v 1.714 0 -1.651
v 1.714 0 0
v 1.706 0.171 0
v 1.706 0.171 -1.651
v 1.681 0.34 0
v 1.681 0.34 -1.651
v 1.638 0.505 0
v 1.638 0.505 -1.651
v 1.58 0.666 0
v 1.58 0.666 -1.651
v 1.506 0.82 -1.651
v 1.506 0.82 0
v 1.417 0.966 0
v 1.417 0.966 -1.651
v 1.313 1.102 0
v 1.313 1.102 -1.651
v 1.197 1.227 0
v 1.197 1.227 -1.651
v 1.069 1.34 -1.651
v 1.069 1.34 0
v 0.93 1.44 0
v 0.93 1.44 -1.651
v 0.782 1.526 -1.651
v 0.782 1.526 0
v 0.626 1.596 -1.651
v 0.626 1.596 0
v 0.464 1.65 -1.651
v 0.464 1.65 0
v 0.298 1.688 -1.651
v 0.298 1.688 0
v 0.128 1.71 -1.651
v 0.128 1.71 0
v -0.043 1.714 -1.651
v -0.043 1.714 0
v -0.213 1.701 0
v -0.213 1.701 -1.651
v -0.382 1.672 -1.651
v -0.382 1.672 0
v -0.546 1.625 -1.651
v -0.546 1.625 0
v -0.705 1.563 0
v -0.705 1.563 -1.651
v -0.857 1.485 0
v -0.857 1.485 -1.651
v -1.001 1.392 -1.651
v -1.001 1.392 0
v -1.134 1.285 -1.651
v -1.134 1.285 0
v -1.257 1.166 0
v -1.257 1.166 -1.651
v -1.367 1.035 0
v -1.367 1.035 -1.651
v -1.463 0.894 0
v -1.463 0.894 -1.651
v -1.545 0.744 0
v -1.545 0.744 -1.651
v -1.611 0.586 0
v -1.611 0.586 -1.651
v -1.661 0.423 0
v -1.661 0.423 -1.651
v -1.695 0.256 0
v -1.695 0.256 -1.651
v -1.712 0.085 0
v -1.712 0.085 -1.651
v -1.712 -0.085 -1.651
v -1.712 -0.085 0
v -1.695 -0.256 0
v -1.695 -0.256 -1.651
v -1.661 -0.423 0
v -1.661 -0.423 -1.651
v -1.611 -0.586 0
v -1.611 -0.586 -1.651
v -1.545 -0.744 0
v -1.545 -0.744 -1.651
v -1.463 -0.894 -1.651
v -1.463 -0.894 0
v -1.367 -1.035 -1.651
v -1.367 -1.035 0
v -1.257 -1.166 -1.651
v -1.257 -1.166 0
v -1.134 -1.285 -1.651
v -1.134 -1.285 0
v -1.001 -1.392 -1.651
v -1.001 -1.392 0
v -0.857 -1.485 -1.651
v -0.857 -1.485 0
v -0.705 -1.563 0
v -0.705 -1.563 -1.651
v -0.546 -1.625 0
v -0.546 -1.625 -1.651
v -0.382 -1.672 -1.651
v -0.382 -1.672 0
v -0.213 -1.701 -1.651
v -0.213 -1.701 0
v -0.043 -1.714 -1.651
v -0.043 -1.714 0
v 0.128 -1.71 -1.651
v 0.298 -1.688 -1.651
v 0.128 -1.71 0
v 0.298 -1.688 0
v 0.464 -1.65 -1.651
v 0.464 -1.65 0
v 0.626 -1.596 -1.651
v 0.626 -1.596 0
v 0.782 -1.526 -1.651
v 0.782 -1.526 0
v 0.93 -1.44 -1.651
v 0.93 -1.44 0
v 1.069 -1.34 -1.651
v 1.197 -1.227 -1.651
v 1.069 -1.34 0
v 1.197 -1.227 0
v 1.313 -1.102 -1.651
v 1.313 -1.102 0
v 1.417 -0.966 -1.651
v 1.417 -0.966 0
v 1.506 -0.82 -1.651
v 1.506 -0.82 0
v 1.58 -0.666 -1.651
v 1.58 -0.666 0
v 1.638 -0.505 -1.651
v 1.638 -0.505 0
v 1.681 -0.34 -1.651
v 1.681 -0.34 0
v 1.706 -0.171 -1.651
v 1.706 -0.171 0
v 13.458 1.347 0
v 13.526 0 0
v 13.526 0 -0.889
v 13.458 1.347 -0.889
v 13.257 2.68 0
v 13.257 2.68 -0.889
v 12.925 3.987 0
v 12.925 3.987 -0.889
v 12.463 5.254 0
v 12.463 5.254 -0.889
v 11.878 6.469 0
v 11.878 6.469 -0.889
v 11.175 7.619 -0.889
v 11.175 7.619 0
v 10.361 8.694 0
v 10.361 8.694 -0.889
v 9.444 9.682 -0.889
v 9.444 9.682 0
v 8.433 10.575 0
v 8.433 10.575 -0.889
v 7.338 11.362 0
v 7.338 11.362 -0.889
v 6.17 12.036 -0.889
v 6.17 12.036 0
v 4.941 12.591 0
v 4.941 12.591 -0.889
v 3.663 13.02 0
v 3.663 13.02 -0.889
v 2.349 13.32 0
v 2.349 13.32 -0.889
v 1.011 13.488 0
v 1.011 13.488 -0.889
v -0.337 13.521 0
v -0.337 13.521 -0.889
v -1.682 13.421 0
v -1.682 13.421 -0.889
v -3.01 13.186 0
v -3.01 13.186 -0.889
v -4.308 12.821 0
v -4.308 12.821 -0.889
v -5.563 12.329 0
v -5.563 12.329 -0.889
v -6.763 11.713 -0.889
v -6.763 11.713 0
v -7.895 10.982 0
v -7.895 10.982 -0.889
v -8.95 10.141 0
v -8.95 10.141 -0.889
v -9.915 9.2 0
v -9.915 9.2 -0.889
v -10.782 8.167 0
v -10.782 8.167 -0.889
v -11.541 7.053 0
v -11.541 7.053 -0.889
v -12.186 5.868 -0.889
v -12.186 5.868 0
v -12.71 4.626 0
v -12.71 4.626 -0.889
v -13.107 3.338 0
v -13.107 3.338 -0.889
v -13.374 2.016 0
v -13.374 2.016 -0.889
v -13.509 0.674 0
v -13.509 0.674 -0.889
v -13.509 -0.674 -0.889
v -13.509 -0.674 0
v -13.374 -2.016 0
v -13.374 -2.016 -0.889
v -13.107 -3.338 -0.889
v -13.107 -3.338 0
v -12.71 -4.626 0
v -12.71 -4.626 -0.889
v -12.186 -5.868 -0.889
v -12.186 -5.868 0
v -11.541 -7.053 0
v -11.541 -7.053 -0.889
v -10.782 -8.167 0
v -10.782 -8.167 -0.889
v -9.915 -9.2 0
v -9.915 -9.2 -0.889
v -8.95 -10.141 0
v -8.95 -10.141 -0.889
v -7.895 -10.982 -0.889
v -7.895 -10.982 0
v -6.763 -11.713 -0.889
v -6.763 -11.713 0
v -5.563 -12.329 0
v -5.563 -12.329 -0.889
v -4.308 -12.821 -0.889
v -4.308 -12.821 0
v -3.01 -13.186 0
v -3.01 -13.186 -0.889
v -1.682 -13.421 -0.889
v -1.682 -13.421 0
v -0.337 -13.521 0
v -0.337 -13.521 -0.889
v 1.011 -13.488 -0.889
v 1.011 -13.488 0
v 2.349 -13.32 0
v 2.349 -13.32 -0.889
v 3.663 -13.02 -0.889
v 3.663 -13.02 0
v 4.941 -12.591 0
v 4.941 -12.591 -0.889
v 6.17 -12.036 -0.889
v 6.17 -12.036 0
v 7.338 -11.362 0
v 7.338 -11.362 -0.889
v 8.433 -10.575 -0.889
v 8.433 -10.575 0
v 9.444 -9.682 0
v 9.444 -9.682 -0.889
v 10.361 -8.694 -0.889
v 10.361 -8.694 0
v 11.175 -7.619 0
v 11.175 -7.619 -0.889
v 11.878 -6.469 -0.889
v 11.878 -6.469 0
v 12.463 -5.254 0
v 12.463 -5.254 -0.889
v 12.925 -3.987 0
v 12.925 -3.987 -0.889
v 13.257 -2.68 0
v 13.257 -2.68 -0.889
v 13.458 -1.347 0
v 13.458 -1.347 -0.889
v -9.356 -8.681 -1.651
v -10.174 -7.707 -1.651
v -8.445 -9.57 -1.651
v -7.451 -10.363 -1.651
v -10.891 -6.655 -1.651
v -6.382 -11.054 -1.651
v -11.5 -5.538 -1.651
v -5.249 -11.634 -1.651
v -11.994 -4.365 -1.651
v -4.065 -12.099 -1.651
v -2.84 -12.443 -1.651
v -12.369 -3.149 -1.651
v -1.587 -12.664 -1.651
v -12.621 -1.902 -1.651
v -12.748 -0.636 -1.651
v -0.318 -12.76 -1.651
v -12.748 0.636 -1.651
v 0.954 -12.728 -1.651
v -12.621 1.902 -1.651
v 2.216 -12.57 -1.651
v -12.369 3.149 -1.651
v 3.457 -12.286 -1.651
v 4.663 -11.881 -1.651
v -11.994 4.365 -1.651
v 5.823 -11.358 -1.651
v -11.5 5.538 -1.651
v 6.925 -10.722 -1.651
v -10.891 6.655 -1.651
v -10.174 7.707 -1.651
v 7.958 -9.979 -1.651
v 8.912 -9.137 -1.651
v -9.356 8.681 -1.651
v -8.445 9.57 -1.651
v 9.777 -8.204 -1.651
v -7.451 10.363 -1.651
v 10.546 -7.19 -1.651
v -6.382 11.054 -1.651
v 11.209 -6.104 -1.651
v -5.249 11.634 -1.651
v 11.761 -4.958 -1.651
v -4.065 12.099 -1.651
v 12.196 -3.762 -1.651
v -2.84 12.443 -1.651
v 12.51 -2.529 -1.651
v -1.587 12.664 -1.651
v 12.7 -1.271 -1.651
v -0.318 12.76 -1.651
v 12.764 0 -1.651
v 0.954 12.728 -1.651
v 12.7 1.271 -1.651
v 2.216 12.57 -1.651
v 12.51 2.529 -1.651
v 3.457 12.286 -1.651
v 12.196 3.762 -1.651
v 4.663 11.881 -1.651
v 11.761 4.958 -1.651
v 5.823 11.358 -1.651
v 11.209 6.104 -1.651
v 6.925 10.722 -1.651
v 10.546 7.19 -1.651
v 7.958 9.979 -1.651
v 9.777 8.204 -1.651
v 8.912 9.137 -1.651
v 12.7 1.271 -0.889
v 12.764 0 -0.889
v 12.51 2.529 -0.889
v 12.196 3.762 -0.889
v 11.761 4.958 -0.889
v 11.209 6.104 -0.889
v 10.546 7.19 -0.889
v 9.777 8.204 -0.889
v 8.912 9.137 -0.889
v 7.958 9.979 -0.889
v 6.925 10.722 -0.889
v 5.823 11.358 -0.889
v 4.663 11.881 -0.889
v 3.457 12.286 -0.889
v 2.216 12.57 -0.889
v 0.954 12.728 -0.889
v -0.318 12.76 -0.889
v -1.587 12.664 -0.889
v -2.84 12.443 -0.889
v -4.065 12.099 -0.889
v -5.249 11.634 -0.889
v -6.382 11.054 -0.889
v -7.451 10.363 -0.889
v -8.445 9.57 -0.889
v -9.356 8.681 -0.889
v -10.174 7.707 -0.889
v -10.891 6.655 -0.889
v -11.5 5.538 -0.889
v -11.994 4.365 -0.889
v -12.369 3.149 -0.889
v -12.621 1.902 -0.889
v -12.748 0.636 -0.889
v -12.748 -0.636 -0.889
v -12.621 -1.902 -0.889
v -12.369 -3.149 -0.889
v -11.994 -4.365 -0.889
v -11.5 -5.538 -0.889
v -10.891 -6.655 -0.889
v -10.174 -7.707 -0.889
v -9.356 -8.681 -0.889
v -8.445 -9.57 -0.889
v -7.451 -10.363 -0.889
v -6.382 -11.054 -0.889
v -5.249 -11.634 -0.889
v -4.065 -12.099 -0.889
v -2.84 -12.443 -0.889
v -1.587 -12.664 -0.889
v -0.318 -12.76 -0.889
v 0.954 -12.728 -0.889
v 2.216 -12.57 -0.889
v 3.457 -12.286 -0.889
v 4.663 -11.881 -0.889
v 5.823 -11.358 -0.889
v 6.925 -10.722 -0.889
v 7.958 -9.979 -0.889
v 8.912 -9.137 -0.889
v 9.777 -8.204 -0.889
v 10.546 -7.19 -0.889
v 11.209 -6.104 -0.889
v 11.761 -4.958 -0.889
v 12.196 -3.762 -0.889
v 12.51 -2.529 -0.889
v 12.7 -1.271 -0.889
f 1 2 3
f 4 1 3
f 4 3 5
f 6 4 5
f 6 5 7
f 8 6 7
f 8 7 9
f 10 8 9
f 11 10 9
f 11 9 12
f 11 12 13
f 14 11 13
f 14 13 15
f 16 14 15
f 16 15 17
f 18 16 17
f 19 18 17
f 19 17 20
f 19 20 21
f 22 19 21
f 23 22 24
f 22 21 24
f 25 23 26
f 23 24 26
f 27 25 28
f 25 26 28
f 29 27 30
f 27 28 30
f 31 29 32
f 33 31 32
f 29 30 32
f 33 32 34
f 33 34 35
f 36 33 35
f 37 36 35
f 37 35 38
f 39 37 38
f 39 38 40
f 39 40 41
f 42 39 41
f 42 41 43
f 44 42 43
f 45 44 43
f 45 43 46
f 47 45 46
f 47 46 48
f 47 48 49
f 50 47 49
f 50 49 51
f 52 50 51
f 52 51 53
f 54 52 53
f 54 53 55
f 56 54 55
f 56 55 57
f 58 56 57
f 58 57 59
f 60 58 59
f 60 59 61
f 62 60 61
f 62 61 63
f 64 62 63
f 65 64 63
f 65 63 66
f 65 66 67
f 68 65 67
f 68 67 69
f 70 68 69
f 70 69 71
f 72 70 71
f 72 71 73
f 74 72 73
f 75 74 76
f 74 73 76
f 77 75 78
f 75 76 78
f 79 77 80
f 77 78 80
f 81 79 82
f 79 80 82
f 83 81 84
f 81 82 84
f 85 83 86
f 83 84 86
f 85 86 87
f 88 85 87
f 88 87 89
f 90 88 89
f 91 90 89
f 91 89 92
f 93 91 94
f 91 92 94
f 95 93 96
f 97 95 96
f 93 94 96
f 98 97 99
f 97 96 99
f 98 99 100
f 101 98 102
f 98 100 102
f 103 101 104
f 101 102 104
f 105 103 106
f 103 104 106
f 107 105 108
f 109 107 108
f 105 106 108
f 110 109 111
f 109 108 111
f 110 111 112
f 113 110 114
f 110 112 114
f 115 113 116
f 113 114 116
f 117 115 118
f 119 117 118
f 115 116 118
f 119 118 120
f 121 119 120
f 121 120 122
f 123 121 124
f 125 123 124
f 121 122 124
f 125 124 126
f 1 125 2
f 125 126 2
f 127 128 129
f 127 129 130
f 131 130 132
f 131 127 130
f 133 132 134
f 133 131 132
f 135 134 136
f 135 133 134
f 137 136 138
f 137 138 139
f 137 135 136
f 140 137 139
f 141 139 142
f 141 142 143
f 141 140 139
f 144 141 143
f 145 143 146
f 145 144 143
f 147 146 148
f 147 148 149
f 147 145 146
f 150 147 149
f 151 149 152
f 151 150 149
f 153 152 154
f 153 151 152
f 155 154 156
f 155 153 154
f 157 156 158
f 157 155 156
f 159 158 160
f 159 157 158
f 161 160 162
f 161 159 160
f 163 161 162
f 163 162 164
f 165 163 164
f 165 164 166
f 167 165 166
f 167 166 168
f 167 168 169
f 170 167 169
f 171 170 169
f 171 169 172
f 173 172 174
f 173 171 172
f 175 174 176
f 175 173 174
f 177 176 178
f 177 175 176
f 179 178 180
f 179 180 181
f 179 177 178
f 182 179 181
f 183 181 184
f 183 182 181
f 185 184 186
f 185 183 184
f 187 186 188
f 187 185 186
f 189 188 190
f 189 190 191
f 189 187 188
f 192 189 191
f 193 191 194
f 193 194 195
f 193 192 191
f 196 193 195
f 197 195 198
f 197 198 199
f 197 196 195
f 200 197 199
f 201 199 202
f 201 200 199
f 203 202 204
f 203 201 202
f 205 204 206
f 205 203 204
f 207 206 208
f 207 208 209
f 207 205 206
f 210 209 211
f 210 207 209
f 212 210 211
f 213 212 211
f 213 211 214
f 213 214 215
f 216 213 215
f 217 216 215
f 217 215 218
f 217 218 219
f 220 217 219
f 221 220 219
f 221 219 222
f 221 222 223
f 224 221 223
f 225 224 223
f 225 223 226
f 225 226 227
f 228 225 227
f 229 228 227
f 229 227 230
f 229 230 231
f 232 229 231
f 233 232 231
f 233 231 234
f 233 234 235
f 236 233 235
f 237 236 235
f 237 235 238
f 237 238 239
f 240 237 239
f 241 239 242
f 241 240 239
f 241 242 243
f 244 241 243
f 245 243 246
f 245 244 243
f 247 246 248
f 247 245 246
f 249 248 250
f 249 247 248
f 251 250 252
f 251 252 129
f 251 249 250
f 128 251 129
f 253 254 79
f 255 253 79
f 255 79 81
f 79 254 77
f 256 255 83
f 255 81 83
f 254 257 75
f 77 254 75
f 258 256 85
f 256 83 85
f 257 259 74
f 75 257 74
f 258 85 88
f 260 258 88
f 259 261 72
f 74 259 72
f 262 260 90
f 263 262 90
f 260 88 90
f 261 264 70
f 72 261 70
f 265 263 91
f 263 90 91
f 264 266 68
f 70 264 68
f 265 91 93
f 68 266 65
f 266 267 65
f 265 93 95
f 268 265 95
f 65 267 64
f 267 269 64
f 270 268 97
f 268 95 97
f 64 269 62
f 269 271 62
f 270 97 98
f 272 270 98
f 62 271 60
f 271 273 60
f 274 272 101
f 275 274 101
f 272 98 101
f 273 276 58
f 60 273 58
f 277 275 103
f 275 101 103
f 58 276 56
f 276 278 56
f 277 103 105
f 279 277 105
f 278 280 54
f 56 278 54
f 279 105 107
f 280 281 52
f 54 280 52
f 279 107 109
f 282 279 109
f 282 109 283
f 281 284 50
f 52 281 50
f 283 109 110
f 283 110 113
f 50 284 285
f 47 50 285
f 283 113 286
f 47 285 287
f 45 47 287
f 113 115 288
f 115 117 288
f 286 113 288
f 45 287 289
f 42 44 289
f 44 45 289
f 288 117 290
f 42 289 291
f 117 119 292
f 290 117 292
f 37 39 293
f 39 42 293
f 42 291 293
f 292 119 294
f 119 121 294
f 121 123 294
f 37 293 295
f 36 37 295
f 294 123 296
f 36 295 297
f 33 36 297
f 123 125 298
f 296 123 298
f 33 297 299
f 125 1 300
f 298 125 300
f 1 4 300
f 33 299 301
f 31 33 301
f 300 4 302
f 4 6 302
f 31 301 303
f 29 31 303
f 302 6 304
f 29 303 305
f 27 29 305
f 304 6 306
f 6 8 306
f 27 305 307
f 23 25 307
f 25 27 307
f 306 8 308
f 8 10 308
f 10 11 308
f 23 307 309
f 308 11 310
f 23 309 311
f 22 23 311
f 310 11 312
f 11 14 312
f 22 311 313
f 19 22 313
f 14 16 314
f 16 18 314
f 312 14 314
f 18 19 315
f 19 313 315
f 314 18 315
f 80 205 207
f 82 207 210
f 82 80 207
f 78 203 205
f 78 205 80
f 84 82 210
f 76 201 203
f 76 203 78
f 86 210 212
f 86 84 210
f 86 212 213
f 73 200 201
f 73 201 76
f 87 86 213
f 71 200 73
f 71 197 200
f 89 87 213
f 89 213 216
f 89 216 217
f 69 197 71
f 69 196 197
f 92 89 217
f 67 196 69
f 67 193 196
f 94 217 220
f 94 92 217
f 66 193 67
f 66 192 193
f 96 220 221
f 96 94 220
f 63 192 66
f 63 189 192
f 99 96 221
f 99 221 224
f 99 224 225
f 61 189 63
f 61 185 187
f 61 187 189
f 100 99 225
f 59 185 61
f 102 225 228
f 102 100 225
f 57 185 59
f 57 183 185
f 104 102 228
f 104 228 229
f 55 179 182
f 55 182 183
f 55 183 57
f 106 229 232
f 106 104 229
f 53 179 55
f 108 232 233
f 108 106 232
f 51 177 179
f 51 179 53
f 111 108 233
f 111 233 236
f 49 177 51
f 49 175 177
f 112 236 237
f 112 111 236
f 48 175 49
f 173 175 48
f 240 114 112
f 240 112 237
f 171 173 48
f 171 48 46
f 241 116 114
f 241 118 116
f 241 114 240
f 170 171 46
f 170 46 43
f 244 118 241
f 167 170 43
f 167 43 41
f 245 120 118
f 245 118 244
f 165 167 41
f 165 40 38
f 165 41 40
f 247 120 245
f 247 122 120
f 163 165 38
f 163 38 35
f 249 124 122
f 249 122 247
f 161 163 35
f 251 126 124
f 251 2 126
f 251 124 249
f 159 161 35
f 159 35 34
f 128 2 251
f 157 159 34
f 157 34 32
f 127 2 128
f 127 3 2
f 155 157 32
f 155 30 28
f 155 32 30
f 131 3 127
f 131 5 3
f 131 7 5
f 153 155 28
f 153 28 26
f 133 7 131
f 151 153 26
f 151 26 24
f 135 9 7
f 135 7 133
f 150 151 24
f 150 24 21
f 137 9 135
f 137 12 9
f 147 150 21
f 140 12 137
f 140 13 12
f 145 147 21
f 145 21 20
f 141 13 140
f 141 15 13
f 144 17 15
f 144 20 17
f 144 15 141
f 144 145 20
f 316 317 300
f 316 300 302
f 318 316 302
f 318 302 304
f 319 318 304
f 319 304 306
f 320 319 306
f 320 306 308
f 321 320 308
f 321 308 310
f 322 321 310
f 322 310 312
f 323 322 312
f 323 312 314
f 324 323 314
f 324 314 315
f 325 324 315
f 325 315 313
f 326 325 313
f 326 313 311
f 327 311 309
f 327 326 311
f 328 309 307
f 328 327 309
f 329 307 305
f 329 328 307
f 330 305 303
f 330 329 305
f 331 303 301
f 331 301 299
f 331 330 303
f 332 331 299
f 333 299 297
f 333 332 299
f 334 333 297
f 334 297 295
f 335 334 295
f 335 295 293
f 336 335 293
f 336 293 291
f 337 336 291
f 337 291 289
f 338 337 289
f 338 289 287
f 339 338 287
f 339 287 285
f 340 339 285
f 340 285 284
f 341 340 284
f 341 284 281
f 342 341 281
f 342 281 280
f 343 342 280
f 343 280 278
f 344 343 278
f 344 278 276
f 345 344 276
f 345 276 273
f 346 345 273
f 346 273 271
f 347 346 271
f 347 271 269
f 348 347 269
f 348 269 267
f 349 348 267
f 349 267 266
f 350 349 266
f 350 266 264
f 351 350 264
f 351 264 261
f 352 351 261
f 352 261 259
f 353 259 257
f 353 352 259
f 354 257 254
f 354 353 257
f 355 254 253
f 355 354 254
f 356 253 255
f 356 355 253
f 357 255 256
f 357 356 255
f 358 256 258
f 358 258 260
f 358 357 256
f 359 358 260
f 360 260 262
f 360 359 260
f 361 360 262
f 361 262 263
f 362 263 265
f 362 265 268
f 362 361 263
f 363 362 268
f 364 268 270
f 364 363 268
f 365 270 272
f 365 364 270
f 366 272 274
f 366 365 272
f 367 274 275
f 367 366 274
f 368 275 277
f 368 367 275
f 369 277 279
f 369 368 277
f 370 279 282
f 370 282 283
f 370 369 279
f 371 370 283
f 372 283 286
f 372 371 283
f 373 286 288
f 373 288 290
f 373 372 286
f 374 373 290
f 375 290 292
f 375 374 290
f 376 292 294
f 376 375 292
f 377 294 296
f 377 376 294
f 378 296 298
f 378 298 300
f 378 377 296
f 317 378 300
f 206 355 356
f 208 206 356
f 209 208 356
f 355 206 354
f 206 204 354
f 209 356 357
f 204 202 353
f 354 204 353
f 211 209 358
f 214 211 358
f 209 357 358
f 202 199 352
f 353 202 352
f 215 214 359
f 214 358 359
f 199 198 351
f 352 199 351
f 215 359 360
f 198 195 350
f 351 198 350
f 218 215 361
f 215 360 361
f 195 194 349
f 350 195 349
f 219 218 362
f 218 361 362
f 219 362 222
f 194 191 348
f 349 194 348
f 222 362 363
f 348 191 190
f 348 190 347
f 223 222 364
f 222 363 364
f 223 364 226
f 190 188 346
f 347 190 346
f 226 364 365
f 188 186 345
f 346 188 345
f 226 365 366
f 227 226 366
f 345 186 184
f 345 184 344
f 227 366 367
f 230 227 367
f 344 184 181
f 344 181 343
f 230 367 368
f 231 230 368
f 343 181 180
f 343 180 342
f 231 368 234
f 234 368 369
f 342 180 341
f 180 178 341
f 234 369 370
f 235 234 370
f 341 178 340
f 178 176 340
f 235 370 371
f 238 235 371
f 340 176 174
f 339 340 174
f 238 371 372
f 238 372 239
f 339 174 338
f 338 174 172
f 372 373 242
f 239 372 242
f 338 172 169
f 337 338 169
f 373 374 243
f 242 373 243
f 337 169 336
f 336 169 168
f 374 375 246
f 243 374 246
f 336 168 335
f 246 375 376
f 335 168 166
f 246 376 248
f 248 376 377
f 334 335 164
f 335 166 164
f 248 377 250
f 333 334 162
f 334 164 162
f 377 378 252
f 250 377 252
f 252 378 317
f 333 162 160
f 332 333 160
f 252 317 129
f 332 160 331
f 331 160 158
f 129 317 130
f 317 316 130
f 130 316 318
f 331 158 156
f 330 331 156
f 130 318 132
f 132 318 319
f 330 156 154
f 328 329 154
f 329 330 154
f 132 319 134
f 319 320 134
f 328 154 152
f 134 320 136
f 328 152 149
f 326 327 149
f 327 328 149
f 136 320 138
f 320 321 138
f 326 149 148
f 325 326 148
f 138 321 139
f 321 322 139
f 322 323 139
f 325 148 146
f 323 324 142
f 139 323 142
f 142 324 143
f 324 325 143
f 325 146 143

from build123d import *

# Parameters (mm, degrees)
F0_R     = 13.5255
F1_DEPTH = 0.889
F2_R     = 12.7635
F3_DEPTH = 1.651
F4_R     = 1.7145
F5_DEPTH = 1.652


with BuildPart() as f1:
    # F0 (on Top) → F1 (new body)
    with BuildSketch(Plane.XY):
        Circle(F0_R)
    extrude(amount=-F1_DEPTH)

    # F2 (on face) → F3 (join)
    with BuildSketch(Plane.XY):
        Circle(F2_R)
    extrude(amount=-F3_DEPTH)

    # F4 (on face) → F5 (cut, through all)
    with BuildSketch(Plane.XY):
        Circle(F4_R)
    extrude(amount=-F5_DEPTH, mode=Mode.SUBTRACT)


solid = f1.part
